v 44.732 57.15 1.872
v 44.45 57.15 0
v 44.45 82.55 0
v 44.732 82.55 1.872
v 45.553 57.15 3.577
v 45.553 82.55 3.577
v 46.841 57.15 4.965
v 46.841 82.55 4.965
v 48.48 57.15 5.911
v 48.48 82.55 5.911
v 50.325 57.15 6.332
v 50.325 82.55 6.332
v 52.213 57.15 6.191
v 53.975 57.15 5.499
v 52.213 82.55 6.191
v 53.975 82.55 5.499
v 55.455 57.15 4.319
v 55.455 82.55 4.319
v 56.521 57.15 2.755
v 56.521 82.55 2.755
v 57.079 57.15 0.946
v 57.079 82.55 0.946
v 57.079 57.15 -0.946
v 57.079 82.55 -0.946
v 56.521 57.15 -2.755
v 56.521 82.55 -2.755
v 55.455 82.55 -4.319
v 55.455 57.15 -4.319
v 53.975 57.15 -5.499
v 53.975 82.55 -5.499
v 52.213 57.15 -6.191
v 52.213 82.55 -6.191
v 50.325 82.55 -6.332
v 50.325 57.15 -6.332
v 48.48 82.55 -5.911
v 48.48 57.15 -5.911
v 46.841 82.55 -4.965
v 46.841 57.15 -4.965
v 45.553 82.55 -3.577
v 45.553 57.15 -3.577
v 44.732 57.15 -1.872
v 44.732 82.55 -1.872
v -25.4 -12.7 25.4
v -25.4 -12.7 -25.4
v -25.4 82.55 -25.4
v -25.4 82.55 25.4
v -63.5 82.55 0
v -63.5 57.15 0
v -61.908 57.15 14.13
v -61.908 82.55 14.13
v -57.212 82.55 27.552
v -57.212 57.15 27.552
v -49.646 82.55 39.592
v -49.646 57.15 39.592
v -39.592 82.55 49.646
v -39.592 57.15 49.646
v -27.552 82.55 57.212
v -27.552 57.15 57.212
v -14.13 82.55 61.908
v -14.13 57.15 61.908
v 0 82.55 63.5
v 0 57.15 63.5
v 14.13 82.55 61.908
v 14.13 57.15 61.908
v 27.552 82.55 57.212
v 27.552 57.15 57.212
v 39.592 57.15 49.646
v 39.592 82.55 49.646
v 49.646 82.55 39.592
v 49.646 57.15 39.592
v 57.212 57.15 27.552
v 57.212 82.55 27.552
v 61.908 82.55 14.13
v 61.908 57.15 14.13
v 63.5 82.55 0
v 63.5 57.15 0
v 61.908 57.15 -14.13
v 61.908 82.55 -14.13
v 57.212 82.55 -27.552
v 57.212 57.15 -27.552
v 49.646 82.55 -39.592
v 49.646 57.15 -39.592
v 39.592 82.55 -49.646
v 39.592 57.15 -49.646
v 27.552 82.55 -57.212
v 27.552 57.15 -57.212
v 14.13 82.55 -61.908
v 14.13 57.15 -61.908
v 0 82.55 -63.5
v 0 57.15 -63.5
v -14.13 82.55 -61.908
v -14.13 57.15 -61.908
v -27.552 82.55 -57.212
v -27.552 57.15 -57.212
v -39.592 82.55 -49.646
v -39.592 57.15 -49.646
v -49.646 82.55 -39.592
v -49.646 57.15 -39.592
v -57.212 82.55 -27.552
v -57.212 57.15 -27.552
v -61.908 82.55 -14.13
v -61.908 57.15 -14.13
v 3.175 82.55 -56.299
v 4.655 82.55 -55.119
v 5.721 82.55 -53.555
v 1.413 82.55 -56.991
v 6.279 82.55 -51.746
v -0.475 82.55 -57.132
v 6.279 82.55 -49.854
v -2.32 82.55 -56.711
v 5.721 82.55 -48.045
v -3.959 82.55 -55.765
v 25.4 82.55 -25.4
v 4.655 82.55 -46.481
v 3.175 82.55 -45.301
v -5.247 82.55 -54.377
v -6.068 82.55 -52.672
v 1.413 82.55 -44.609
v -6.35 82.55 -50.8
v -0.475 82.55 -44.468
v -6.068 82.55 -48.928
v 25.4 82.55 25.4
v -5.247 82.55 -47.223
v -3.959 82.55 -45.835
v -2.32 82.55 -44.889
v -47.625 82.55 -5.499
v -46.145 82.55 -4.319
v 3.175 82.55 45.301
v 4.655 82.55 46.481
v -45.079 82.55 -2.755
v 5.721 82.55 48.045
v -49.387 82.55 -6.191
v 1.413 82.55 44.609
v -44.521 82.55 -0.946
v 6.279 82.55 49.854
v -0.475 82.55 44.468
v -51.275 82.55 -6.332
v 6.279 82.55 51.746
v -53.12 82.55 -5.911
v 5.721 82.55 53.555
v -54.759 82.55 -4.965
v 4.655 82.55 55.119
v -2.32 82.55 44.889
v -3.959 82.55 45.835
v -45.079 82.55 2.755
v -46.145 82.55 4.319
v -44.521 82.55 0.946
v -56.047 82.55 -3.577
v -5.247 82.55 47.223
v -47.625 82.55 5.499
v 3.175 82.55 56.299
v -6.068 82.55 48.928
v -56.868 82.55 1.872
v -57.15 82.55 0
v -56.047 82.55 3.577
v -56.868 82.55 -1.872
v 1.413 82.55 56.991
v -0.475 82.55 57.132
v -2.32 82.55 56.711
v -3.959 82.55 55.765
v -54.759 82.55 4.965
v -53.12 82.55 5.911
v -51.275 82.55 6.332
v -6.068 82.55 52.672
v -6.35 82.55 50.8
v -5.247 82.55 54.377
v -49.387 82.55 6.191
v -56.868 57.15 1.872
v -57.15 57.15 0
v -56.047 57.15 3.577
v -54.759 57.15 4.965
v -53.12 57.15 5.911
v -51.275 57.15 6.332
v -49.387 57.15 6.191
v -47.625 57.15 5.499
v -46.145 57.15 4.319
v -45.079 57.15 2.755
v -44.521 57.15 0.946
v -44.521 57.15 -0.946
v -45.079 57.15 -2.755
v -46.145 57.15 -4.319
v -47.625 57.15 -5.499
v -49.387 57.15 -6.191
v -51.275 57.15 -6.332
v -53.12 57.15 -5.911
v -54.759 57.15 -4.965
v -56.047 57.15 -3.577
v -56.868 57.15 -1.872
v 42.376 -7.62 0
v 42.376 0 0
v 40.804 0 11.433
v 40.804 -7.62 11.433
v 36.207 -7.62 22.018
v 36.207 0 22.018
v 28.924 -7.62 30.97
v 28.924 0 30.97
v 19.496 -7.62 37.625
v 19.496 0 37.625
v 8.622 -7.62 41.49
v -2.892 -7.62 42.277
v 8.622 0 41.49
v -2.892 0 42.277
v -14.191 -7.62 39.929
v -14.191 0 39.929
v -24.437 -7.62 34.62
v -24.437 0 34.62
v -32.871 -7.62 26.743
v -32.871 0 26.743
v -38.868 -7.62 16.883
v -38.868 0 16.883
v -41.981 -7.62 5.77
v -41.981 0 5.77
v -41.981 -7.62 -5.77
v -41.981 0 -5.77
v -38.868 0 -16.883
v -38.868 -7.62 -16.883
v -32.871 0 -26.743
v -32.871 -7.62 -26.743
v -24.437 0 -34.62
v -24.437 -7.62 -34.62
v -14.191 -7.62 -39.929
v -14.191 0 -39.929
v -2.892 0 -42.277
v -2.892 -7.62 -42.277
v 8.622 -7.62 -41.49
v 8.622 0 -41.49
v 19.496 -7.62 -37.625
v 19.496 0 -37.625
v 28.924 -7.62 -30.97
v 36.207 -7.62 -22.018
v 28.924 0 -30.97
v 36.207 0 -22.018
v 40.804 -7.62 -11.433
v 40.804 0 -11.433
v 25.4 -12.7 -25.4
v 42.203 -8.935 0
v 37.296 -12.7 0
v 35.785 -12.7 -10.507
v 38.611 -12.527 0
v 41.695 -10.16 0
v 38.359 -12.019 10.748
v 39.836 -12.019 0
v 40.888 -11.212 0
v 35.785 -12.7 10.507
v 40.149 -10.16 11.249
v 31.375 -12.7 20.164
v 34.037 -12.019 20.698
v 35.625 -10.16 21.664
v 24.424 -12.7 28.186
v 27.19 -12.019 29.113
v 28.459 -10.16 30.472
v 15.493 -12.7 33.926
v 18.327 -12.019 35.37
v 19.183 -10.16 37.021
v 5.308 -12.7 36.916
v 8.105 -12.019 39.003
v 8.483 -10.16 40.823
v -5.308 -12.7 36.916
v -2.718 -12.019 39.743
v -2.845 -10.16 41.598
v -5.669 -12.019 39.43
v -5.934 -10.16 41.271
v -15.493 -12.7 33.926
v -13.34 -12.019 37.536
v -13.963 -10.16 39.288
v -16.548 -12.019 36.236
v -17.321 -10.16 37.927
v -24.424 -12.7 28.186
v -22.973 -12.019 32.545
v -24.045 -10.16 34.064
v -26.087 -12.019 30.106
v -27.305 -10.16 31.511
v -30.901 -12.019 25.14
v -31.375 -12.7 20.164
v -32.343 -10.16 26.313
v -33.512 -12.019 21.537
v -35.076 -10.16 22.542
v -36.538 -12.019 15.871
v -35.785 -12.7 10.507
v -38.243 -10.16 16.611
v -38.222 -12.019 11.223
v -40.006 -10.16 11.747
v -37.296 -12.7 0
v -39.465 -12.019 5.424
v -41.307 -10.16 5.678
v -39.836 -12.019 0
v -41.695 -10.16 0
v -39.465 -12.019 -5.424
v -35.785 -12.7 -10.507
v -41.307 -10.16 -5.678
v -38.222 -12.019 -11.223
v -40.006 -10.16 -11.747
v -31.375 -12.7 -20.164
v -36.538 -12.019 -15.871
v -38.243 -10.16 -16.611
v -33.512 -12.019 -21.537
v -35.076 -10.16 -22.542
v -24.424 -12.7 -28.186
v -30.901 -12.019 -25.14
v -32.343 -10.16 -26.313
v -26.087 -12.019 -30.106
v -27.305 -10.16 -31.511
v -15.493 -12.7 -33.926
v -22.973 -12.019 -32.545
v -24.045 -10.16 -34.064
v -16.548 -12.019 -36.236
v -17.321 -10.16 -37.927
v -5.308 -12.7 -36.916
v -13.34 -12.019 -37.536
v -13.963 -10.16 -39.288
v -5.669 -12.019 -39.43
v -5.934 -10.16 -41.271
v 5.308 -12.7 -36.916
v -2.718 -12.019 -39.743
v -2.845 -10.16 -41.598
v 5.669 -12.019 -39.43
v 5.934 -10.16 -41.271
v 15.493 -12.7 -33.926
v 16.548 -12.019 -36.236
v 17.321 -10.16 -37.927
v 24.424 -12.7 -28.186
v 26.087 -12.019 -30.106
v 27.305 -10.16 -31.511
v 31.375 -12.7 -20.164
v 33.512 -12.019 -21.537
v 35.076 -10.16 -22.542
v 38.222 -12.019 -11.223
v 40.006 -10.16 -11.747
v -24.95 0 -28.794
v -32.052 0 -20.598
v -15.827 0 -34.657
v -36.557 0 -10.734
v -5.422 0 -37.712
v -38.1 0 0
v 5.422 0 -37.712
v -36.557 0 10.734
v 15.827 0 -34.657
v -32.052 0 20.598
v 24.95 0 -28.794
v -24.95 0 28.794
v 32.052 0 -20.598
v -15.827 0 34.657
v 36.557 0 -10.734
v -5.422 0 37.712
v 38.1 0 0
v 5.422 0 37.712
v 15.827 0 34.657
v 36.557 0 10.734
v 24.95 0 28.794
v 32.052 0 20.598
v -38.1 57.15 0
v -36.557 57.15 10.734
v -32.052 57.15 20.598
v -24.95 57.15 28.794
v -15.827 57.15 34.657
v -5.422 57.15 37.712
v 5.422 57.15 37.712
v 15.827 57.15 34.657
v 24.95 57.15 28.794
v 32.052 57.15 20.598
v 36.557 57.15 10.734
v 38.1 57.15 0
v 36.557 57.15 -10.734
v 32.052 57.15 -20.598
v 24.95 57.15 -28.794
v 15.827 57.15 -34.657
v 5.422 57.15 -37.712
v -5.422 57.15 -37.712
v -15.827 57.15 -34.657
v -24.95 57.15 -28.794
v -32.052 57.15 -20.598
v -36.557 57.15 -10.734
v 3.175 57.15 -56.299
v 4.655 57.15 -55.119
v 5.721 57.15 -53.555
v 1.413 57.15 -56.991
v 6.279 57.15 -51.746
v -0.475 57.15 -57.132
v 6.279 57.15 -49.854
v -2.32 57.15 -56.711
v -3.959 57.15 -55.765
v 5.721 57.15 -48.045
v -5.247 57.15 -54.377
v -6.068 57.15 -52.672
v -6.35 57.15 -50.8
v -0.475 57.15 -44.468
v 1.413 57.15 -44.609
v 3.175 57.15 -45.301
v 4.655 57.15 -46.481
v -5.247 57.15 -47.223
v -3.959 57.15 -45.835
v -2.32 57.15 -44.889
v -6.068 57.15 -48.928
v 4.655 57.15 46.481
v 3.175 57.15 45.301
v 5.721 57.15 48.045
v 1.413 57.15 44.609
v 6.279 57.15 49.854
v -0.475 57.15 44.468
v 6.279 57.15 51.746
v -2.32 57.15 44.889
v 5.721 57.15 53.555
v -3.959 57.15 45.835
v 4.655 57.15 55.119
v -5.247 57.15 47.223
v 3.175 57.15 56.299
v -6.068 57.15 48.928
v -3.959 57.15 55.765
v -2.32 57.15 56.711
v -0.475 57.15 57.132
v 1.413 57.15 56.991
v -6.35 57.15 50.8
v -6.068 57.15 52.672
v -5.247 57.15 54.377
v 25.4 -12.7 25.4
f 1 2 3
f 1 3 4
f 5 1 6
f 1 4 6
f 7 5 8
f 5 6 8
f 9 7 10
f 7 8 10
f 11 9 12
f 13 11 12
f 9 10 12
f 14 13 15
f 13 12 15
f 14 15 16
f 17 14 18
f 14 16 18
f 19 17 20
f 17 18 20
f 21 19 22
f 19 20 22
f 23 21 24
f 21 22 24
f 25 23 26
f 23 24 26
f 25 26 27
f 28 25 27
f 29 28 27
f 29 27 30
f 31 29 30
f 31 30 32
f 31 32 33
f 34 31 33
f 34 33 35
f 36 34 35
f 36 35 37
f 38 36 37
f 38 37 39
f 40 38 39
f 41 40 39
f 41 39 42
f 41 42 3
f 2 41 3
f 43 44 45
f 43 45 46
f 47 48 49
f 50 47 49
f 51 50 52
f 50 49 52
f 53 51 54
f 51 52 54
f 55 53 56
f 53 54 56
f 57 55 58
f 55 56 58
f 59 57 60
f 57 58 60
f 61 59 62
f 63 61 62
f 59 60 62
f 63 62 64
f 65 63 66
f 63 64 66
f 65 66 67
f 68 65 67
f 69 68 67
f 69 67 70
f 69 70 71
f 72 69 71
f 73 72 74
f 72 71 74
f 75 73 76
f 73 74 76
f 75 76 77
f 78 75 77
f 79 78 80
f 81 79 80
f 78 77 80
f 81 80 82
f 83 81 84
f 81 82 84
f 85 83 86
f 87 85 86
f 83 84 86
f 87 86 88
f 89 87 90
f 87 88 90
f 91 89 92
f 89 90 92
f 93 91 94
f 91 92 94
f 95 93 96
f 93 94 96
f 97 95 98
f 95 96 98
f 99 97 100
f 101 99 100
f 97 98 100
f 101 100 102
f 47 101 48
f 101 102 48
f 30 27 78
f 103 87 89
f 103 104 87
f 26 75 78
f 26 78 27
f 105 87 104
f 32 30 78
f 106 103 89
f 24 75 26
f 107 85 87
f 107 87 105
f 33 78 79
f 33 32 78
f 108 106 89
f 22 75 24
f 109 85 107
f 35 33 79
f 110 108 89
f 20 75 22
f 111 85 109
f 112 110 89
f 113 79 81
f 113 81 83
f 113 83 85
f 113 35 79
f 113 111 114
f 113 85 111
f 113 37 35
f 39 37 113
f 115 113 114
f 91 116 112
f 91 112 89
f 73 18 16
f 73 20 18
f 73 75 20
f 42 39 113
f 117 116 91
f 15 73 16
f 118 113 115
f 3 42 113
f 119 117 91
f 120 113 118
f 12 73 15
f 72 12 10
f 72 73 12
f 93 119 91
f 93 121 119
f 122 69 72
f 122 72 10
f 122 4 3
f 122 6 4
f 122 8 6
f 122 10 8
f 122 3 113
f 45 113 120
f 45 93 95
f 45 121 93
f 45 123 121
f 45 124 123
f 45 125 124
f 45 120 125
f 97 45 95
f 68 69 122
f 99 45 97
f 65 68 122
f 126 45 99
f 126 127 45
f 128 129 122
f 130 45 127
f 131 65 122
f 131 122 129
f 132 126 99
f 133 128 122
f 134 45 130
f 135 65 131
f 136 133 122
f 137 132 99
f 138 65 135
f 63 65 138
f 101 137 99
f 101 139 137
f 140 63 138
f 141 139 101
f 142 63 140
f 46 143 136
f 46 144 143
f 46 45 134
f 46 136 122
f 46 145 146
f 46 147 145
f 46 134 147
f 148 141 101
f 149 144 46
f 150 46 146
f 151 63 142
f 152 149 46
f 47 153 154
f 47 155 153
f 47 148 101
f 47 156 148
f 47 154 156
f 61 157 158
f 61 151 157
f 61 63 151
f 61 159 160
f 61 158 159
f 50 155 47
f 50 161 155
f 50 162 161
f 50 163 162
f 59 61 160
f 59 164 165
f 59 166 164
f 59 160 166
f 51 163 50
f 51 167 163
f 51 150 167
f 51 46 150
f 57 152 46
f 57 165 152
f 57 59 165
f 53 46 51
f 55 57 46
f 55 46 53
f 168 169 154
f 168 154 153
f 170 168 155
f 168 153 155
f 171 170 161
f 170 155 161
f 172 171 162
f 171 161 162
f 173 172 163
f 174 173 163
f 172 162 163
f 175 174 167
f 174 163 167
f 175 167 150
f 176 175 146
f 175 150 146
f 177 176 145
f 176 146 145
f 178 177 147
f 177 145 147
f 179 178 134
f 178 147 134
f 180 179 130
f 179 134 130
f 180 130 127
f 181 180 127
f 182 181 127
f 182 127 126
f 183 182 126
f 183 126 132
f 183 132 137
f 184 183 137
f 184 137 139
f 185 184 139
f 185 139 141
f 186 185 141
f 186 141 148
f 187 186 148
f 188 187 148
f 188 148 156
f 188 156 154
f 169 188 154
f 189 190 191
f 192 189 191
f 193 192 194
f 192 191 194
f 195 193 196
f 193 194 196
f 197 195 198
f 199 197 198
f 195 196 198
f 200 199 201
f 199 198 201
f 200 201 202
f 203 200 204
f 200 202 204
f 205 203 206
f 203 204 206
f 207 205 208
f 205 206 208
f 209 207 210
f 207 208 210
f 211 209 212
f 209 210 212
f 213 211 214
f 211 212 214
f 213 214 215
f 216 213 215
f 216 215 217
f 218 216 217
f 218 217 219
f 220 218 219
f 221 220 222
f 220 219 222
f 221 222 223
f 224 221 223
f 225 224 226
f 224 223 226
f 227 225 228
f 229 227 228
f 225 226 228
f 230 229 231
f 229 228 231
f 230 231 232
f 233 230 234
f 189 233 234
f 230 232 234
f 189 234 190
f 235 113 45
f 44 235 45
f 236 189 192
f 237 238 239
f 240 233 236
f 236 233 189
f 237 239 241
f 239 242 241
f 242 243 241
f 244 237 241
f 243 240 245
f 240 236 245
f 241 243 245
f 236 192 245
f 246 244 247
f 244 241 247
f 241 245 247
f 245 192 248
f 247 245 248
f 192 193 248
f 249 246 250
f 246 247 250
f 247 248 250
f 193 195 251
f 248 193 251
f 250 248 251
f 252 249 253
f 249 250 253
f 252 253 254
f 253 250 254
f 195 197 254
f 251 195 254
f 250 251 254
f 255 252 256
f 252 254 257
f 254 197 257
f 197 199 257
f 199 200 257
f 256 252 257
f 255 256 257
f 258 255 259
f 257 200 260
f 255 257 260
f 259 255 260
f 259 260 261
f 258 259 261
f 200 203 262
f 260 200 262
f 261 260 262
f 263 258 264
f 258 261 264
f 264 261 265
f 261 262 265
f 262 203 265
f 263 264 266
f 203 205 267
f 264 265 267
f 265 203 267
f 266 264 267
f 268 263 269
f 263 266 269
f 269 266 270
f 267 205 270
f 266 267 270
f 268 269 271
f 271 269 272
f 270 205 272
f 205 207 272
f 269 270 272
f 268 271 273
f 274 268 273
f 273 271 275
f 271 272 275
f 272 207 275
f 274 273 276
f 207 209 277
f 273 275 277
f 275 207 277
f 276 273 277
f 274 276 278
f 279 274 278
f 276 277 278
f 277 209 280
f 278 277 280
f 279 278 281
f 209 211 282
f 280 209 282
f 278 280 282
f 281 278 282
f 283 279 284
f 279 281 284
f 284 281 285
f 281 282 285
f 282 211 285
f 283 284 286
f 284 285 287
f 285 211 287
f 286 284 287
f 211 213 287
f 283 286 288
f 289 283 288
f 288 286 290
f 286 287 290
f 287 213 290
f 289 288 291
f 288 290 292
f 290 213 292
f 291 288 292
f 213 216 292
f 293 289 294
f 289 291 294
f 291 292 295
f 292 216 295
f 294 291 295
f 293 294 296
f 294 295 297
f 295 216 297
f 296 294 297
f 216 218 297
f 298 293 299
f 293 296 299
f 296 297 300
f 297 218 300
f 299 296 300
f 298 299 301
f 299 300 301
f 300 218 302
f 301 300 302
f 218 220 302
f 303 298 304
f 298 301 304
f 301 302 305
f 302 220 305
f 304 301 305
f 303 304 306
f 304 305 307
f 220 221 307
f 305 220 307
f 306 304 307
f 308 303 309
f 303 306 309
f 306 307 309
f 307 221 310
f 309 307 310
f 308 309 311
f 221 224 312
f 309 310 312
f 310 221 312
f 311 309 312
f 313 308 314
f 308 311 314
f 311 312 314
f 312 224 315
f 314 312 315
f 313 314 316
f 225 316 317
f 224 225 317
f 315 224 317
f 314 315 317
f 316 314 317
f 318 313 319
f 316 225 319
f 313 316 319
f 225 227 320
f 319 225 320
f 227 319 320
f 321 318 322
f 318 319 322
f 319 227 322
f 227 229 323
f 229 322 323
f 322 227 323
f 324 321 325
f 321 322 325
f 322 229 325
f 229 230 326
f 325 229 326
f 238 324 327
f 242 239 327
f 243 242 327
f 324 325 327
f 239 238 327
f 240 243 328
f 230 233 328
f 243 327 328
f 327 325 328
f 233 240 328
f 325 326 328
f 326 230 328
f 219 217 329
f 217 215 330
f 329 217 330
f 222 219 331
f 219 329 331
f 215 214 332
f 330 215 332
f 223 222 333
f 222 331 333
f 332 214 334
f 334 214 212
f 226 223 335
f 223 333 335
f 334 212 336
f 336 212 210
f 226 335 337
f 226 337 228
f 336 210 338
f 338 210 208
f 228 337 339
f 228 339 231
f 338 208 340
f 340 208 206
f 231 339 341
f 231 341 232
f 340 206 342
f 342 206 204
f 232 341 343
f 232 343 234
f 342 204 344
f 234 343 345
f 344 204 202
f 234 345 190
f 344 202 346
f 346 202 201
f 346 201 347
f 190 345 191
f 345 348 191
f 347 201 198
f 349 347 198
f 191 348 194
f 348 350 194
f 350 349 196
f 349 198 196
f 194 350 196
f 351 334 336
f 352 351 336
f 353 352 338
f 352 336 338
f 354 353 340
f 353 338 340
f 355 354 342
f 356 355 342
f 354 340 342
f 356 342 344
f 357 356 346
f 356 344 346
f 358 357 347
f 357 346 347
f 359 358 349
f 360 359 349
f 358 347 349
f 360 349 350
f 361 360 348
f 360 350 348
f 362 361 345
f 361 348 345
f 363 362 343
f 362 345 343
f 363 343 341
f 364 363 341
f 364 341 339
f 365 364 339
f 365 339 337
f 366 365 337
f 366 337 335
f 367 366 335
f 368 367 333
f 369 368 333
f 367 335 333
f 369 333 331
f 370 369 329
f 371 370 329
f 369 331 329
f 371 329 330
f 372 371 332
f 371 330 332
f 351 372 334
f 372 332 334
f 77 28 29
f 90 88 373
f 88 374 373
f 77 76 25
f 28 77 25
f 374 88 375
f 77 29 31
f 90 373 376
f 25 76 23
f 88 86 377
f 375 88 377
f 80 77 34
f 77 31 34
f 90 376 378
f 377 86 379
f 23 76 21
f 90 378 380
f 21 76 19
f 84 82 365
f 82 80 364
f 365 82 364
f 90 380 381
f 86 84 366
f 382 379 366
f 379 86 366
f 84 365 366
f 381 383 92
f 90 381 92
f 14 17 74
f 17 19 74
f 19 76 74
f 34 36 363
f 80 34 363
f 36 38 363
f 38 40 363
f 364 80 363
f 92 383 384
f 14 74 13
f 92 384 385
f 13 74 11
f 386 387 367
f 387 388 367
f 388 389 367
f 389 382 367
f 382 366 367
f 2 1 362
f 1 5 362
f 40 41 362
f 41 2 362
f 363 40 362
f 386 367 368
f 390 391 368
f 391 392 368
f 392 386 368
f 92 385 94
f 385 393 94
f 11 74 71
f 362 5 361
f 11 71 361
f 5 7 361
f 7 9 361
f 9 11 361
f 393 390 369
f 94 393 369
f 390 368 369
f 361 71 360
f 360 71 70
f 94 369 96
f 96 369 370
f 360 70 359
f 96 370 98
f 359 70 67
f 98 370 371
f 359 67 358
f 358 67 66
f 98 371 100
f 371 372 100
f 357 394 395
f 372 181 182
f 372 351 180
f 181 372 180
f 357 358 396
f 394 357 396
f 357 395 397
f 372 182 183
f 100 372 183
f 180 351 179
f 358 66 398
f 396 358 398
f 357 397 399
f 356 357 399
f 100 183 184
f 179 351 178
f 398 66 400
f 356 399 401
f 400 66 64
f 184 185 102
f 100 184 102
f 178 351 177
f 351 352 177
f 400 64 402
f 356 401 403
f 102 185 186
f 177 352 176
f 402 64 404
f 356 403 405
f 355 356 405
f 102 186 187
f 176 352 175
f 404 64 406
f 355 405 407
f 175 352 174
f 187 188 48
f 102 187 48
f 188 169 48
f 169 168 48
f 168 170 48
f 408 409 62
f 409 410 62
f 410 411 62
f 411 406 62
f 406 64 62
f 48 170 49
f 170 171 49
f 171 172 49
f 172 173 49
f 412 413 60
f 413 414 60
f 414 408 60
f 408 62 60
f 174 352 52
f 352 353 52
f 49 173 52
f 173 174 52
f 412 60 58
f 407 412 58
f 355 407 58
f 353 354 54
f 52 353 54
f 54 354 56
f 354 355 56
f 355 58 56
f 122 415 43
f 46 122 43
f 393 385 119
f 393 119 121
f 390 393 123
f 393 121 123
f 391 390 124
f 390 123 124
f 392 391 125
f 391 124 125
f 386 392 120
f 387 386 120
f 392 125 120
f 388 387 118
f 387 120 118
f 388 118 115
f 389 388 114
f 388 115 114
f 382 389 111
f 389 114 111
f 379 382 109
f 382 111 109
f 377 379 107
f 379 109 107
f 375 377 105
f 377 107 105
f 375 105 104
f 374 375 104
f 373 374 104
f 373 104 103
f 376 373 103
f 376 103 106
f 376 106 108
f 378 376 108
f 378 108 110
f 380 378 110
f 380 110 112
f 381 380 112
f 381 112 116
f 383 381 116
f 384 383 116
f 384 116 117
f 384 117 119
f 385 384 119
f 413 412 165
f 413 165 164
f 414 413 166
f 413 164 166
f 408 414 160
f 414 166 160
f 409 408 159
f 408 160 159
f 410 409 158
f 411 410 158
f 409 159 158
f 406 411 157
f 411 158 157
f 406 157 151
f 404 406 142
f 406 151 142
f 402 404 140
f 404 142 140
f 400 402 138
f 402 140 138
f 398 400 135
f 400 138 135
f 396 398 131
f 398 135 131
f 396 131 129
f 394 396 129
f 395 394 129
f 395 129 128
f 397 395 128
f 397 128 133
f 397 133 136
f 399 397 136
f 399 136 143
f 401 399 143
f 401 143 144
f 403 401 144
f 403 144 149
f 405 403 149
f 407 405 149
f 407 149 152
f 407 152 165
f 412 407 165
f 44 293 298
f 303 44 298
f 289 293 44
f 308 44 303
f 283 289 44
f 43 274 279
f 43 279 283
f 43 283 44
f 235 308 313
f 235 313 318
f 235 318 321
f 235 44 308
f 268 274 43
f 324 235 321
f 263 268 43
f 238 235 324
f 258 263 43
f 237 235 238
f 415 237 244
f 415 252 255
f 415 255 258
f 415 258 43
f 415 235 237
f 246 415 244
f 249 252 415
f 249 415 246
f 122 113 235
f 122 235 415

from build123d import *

# Parameters (mm, degrees)
F0_R     = 42.3758659095
F0_R_2   = 38.1
F0_W     = 50.8
F0_H     = 50.8
F1_DEPTH = 12.7
F2_R     = 38.1
F2_W     = 50.8
F2_H     = 50.8
F3_DEPTH = 57.15
F4_R     = 63.5
F4_R_2   = 38.1
F4_W     = 50.8
F4_H     = 50.8
F5_DEPTH = 25.4
F6_R     = 6.35
F7_DEPTH = 38.1
F8_R     = 5.08


with BuildPart() as f1:
    # F0 (on Front) → F1 (new body)
    with BuildSketch(Plane.XZ):
        Circle(F0_R)
        Circle(F0_R_2, mode=Mode.SUBTRACT)
        Circle(F0_R_2)
        Rectangle(F0_W, F0_H, mode=Mode.SUBTRACT)
    extrude(amount=F1_DEPTH)

    # F2 (on face) → F3 (join)
    with BuildSketch(Plane(origin=(0, 0, 0), x_dir=(-1, 0, 0), z_dir=(0, 1, 0))):
        Circle(F2_R)
        Rectangle(F2_W, F2_H, mode=Mode.SUBTRACT)
    extrude(amount=F3_DEPTH)

    # F4 (on face) → F5 (join)
    with BuildSketch(Plane(origin=(0, 57.15, 0), x_dir=(-1, 0, 0), z_dir=(0, 1, 0))):
        Circle(F4_R)
        Circle(F4_R_2, mode=Mode.SUBTRACT)
        Circle(F4_R_2)
        Rectangle(F4_W, F4_H, mode=Mode.SUBTRACT)
    extrude(amount=F5_DEPTH)

    # F6 (on face) → F7 (cut)
    with BuildSketch(Plane(origin=(0, 82.55, 0), x_dir=(-1, 0, 0), z_dir=(0, 1, 0))):
        with Locations((0, -50.8)):
            Circle(F6_R)
        with Locations((-50.8, 0)):
            Circle(F6_R)
        with Locations((0, 50.8)):
            Circle(F6_R)
        with Locations((50.8, 0)):
            Circle(F6_R)
    extrude(amount=-F7_DEPTH, mode=Mode.SUBTRACT)

    # F8
    f8_edges = [f1.edges().sort_by_distance(p)[0] for p in [
        (-42.375866, -12.7, 0),
    ]]
    fillet(f8_edges, radius=F8_R)


solid = f1.part
